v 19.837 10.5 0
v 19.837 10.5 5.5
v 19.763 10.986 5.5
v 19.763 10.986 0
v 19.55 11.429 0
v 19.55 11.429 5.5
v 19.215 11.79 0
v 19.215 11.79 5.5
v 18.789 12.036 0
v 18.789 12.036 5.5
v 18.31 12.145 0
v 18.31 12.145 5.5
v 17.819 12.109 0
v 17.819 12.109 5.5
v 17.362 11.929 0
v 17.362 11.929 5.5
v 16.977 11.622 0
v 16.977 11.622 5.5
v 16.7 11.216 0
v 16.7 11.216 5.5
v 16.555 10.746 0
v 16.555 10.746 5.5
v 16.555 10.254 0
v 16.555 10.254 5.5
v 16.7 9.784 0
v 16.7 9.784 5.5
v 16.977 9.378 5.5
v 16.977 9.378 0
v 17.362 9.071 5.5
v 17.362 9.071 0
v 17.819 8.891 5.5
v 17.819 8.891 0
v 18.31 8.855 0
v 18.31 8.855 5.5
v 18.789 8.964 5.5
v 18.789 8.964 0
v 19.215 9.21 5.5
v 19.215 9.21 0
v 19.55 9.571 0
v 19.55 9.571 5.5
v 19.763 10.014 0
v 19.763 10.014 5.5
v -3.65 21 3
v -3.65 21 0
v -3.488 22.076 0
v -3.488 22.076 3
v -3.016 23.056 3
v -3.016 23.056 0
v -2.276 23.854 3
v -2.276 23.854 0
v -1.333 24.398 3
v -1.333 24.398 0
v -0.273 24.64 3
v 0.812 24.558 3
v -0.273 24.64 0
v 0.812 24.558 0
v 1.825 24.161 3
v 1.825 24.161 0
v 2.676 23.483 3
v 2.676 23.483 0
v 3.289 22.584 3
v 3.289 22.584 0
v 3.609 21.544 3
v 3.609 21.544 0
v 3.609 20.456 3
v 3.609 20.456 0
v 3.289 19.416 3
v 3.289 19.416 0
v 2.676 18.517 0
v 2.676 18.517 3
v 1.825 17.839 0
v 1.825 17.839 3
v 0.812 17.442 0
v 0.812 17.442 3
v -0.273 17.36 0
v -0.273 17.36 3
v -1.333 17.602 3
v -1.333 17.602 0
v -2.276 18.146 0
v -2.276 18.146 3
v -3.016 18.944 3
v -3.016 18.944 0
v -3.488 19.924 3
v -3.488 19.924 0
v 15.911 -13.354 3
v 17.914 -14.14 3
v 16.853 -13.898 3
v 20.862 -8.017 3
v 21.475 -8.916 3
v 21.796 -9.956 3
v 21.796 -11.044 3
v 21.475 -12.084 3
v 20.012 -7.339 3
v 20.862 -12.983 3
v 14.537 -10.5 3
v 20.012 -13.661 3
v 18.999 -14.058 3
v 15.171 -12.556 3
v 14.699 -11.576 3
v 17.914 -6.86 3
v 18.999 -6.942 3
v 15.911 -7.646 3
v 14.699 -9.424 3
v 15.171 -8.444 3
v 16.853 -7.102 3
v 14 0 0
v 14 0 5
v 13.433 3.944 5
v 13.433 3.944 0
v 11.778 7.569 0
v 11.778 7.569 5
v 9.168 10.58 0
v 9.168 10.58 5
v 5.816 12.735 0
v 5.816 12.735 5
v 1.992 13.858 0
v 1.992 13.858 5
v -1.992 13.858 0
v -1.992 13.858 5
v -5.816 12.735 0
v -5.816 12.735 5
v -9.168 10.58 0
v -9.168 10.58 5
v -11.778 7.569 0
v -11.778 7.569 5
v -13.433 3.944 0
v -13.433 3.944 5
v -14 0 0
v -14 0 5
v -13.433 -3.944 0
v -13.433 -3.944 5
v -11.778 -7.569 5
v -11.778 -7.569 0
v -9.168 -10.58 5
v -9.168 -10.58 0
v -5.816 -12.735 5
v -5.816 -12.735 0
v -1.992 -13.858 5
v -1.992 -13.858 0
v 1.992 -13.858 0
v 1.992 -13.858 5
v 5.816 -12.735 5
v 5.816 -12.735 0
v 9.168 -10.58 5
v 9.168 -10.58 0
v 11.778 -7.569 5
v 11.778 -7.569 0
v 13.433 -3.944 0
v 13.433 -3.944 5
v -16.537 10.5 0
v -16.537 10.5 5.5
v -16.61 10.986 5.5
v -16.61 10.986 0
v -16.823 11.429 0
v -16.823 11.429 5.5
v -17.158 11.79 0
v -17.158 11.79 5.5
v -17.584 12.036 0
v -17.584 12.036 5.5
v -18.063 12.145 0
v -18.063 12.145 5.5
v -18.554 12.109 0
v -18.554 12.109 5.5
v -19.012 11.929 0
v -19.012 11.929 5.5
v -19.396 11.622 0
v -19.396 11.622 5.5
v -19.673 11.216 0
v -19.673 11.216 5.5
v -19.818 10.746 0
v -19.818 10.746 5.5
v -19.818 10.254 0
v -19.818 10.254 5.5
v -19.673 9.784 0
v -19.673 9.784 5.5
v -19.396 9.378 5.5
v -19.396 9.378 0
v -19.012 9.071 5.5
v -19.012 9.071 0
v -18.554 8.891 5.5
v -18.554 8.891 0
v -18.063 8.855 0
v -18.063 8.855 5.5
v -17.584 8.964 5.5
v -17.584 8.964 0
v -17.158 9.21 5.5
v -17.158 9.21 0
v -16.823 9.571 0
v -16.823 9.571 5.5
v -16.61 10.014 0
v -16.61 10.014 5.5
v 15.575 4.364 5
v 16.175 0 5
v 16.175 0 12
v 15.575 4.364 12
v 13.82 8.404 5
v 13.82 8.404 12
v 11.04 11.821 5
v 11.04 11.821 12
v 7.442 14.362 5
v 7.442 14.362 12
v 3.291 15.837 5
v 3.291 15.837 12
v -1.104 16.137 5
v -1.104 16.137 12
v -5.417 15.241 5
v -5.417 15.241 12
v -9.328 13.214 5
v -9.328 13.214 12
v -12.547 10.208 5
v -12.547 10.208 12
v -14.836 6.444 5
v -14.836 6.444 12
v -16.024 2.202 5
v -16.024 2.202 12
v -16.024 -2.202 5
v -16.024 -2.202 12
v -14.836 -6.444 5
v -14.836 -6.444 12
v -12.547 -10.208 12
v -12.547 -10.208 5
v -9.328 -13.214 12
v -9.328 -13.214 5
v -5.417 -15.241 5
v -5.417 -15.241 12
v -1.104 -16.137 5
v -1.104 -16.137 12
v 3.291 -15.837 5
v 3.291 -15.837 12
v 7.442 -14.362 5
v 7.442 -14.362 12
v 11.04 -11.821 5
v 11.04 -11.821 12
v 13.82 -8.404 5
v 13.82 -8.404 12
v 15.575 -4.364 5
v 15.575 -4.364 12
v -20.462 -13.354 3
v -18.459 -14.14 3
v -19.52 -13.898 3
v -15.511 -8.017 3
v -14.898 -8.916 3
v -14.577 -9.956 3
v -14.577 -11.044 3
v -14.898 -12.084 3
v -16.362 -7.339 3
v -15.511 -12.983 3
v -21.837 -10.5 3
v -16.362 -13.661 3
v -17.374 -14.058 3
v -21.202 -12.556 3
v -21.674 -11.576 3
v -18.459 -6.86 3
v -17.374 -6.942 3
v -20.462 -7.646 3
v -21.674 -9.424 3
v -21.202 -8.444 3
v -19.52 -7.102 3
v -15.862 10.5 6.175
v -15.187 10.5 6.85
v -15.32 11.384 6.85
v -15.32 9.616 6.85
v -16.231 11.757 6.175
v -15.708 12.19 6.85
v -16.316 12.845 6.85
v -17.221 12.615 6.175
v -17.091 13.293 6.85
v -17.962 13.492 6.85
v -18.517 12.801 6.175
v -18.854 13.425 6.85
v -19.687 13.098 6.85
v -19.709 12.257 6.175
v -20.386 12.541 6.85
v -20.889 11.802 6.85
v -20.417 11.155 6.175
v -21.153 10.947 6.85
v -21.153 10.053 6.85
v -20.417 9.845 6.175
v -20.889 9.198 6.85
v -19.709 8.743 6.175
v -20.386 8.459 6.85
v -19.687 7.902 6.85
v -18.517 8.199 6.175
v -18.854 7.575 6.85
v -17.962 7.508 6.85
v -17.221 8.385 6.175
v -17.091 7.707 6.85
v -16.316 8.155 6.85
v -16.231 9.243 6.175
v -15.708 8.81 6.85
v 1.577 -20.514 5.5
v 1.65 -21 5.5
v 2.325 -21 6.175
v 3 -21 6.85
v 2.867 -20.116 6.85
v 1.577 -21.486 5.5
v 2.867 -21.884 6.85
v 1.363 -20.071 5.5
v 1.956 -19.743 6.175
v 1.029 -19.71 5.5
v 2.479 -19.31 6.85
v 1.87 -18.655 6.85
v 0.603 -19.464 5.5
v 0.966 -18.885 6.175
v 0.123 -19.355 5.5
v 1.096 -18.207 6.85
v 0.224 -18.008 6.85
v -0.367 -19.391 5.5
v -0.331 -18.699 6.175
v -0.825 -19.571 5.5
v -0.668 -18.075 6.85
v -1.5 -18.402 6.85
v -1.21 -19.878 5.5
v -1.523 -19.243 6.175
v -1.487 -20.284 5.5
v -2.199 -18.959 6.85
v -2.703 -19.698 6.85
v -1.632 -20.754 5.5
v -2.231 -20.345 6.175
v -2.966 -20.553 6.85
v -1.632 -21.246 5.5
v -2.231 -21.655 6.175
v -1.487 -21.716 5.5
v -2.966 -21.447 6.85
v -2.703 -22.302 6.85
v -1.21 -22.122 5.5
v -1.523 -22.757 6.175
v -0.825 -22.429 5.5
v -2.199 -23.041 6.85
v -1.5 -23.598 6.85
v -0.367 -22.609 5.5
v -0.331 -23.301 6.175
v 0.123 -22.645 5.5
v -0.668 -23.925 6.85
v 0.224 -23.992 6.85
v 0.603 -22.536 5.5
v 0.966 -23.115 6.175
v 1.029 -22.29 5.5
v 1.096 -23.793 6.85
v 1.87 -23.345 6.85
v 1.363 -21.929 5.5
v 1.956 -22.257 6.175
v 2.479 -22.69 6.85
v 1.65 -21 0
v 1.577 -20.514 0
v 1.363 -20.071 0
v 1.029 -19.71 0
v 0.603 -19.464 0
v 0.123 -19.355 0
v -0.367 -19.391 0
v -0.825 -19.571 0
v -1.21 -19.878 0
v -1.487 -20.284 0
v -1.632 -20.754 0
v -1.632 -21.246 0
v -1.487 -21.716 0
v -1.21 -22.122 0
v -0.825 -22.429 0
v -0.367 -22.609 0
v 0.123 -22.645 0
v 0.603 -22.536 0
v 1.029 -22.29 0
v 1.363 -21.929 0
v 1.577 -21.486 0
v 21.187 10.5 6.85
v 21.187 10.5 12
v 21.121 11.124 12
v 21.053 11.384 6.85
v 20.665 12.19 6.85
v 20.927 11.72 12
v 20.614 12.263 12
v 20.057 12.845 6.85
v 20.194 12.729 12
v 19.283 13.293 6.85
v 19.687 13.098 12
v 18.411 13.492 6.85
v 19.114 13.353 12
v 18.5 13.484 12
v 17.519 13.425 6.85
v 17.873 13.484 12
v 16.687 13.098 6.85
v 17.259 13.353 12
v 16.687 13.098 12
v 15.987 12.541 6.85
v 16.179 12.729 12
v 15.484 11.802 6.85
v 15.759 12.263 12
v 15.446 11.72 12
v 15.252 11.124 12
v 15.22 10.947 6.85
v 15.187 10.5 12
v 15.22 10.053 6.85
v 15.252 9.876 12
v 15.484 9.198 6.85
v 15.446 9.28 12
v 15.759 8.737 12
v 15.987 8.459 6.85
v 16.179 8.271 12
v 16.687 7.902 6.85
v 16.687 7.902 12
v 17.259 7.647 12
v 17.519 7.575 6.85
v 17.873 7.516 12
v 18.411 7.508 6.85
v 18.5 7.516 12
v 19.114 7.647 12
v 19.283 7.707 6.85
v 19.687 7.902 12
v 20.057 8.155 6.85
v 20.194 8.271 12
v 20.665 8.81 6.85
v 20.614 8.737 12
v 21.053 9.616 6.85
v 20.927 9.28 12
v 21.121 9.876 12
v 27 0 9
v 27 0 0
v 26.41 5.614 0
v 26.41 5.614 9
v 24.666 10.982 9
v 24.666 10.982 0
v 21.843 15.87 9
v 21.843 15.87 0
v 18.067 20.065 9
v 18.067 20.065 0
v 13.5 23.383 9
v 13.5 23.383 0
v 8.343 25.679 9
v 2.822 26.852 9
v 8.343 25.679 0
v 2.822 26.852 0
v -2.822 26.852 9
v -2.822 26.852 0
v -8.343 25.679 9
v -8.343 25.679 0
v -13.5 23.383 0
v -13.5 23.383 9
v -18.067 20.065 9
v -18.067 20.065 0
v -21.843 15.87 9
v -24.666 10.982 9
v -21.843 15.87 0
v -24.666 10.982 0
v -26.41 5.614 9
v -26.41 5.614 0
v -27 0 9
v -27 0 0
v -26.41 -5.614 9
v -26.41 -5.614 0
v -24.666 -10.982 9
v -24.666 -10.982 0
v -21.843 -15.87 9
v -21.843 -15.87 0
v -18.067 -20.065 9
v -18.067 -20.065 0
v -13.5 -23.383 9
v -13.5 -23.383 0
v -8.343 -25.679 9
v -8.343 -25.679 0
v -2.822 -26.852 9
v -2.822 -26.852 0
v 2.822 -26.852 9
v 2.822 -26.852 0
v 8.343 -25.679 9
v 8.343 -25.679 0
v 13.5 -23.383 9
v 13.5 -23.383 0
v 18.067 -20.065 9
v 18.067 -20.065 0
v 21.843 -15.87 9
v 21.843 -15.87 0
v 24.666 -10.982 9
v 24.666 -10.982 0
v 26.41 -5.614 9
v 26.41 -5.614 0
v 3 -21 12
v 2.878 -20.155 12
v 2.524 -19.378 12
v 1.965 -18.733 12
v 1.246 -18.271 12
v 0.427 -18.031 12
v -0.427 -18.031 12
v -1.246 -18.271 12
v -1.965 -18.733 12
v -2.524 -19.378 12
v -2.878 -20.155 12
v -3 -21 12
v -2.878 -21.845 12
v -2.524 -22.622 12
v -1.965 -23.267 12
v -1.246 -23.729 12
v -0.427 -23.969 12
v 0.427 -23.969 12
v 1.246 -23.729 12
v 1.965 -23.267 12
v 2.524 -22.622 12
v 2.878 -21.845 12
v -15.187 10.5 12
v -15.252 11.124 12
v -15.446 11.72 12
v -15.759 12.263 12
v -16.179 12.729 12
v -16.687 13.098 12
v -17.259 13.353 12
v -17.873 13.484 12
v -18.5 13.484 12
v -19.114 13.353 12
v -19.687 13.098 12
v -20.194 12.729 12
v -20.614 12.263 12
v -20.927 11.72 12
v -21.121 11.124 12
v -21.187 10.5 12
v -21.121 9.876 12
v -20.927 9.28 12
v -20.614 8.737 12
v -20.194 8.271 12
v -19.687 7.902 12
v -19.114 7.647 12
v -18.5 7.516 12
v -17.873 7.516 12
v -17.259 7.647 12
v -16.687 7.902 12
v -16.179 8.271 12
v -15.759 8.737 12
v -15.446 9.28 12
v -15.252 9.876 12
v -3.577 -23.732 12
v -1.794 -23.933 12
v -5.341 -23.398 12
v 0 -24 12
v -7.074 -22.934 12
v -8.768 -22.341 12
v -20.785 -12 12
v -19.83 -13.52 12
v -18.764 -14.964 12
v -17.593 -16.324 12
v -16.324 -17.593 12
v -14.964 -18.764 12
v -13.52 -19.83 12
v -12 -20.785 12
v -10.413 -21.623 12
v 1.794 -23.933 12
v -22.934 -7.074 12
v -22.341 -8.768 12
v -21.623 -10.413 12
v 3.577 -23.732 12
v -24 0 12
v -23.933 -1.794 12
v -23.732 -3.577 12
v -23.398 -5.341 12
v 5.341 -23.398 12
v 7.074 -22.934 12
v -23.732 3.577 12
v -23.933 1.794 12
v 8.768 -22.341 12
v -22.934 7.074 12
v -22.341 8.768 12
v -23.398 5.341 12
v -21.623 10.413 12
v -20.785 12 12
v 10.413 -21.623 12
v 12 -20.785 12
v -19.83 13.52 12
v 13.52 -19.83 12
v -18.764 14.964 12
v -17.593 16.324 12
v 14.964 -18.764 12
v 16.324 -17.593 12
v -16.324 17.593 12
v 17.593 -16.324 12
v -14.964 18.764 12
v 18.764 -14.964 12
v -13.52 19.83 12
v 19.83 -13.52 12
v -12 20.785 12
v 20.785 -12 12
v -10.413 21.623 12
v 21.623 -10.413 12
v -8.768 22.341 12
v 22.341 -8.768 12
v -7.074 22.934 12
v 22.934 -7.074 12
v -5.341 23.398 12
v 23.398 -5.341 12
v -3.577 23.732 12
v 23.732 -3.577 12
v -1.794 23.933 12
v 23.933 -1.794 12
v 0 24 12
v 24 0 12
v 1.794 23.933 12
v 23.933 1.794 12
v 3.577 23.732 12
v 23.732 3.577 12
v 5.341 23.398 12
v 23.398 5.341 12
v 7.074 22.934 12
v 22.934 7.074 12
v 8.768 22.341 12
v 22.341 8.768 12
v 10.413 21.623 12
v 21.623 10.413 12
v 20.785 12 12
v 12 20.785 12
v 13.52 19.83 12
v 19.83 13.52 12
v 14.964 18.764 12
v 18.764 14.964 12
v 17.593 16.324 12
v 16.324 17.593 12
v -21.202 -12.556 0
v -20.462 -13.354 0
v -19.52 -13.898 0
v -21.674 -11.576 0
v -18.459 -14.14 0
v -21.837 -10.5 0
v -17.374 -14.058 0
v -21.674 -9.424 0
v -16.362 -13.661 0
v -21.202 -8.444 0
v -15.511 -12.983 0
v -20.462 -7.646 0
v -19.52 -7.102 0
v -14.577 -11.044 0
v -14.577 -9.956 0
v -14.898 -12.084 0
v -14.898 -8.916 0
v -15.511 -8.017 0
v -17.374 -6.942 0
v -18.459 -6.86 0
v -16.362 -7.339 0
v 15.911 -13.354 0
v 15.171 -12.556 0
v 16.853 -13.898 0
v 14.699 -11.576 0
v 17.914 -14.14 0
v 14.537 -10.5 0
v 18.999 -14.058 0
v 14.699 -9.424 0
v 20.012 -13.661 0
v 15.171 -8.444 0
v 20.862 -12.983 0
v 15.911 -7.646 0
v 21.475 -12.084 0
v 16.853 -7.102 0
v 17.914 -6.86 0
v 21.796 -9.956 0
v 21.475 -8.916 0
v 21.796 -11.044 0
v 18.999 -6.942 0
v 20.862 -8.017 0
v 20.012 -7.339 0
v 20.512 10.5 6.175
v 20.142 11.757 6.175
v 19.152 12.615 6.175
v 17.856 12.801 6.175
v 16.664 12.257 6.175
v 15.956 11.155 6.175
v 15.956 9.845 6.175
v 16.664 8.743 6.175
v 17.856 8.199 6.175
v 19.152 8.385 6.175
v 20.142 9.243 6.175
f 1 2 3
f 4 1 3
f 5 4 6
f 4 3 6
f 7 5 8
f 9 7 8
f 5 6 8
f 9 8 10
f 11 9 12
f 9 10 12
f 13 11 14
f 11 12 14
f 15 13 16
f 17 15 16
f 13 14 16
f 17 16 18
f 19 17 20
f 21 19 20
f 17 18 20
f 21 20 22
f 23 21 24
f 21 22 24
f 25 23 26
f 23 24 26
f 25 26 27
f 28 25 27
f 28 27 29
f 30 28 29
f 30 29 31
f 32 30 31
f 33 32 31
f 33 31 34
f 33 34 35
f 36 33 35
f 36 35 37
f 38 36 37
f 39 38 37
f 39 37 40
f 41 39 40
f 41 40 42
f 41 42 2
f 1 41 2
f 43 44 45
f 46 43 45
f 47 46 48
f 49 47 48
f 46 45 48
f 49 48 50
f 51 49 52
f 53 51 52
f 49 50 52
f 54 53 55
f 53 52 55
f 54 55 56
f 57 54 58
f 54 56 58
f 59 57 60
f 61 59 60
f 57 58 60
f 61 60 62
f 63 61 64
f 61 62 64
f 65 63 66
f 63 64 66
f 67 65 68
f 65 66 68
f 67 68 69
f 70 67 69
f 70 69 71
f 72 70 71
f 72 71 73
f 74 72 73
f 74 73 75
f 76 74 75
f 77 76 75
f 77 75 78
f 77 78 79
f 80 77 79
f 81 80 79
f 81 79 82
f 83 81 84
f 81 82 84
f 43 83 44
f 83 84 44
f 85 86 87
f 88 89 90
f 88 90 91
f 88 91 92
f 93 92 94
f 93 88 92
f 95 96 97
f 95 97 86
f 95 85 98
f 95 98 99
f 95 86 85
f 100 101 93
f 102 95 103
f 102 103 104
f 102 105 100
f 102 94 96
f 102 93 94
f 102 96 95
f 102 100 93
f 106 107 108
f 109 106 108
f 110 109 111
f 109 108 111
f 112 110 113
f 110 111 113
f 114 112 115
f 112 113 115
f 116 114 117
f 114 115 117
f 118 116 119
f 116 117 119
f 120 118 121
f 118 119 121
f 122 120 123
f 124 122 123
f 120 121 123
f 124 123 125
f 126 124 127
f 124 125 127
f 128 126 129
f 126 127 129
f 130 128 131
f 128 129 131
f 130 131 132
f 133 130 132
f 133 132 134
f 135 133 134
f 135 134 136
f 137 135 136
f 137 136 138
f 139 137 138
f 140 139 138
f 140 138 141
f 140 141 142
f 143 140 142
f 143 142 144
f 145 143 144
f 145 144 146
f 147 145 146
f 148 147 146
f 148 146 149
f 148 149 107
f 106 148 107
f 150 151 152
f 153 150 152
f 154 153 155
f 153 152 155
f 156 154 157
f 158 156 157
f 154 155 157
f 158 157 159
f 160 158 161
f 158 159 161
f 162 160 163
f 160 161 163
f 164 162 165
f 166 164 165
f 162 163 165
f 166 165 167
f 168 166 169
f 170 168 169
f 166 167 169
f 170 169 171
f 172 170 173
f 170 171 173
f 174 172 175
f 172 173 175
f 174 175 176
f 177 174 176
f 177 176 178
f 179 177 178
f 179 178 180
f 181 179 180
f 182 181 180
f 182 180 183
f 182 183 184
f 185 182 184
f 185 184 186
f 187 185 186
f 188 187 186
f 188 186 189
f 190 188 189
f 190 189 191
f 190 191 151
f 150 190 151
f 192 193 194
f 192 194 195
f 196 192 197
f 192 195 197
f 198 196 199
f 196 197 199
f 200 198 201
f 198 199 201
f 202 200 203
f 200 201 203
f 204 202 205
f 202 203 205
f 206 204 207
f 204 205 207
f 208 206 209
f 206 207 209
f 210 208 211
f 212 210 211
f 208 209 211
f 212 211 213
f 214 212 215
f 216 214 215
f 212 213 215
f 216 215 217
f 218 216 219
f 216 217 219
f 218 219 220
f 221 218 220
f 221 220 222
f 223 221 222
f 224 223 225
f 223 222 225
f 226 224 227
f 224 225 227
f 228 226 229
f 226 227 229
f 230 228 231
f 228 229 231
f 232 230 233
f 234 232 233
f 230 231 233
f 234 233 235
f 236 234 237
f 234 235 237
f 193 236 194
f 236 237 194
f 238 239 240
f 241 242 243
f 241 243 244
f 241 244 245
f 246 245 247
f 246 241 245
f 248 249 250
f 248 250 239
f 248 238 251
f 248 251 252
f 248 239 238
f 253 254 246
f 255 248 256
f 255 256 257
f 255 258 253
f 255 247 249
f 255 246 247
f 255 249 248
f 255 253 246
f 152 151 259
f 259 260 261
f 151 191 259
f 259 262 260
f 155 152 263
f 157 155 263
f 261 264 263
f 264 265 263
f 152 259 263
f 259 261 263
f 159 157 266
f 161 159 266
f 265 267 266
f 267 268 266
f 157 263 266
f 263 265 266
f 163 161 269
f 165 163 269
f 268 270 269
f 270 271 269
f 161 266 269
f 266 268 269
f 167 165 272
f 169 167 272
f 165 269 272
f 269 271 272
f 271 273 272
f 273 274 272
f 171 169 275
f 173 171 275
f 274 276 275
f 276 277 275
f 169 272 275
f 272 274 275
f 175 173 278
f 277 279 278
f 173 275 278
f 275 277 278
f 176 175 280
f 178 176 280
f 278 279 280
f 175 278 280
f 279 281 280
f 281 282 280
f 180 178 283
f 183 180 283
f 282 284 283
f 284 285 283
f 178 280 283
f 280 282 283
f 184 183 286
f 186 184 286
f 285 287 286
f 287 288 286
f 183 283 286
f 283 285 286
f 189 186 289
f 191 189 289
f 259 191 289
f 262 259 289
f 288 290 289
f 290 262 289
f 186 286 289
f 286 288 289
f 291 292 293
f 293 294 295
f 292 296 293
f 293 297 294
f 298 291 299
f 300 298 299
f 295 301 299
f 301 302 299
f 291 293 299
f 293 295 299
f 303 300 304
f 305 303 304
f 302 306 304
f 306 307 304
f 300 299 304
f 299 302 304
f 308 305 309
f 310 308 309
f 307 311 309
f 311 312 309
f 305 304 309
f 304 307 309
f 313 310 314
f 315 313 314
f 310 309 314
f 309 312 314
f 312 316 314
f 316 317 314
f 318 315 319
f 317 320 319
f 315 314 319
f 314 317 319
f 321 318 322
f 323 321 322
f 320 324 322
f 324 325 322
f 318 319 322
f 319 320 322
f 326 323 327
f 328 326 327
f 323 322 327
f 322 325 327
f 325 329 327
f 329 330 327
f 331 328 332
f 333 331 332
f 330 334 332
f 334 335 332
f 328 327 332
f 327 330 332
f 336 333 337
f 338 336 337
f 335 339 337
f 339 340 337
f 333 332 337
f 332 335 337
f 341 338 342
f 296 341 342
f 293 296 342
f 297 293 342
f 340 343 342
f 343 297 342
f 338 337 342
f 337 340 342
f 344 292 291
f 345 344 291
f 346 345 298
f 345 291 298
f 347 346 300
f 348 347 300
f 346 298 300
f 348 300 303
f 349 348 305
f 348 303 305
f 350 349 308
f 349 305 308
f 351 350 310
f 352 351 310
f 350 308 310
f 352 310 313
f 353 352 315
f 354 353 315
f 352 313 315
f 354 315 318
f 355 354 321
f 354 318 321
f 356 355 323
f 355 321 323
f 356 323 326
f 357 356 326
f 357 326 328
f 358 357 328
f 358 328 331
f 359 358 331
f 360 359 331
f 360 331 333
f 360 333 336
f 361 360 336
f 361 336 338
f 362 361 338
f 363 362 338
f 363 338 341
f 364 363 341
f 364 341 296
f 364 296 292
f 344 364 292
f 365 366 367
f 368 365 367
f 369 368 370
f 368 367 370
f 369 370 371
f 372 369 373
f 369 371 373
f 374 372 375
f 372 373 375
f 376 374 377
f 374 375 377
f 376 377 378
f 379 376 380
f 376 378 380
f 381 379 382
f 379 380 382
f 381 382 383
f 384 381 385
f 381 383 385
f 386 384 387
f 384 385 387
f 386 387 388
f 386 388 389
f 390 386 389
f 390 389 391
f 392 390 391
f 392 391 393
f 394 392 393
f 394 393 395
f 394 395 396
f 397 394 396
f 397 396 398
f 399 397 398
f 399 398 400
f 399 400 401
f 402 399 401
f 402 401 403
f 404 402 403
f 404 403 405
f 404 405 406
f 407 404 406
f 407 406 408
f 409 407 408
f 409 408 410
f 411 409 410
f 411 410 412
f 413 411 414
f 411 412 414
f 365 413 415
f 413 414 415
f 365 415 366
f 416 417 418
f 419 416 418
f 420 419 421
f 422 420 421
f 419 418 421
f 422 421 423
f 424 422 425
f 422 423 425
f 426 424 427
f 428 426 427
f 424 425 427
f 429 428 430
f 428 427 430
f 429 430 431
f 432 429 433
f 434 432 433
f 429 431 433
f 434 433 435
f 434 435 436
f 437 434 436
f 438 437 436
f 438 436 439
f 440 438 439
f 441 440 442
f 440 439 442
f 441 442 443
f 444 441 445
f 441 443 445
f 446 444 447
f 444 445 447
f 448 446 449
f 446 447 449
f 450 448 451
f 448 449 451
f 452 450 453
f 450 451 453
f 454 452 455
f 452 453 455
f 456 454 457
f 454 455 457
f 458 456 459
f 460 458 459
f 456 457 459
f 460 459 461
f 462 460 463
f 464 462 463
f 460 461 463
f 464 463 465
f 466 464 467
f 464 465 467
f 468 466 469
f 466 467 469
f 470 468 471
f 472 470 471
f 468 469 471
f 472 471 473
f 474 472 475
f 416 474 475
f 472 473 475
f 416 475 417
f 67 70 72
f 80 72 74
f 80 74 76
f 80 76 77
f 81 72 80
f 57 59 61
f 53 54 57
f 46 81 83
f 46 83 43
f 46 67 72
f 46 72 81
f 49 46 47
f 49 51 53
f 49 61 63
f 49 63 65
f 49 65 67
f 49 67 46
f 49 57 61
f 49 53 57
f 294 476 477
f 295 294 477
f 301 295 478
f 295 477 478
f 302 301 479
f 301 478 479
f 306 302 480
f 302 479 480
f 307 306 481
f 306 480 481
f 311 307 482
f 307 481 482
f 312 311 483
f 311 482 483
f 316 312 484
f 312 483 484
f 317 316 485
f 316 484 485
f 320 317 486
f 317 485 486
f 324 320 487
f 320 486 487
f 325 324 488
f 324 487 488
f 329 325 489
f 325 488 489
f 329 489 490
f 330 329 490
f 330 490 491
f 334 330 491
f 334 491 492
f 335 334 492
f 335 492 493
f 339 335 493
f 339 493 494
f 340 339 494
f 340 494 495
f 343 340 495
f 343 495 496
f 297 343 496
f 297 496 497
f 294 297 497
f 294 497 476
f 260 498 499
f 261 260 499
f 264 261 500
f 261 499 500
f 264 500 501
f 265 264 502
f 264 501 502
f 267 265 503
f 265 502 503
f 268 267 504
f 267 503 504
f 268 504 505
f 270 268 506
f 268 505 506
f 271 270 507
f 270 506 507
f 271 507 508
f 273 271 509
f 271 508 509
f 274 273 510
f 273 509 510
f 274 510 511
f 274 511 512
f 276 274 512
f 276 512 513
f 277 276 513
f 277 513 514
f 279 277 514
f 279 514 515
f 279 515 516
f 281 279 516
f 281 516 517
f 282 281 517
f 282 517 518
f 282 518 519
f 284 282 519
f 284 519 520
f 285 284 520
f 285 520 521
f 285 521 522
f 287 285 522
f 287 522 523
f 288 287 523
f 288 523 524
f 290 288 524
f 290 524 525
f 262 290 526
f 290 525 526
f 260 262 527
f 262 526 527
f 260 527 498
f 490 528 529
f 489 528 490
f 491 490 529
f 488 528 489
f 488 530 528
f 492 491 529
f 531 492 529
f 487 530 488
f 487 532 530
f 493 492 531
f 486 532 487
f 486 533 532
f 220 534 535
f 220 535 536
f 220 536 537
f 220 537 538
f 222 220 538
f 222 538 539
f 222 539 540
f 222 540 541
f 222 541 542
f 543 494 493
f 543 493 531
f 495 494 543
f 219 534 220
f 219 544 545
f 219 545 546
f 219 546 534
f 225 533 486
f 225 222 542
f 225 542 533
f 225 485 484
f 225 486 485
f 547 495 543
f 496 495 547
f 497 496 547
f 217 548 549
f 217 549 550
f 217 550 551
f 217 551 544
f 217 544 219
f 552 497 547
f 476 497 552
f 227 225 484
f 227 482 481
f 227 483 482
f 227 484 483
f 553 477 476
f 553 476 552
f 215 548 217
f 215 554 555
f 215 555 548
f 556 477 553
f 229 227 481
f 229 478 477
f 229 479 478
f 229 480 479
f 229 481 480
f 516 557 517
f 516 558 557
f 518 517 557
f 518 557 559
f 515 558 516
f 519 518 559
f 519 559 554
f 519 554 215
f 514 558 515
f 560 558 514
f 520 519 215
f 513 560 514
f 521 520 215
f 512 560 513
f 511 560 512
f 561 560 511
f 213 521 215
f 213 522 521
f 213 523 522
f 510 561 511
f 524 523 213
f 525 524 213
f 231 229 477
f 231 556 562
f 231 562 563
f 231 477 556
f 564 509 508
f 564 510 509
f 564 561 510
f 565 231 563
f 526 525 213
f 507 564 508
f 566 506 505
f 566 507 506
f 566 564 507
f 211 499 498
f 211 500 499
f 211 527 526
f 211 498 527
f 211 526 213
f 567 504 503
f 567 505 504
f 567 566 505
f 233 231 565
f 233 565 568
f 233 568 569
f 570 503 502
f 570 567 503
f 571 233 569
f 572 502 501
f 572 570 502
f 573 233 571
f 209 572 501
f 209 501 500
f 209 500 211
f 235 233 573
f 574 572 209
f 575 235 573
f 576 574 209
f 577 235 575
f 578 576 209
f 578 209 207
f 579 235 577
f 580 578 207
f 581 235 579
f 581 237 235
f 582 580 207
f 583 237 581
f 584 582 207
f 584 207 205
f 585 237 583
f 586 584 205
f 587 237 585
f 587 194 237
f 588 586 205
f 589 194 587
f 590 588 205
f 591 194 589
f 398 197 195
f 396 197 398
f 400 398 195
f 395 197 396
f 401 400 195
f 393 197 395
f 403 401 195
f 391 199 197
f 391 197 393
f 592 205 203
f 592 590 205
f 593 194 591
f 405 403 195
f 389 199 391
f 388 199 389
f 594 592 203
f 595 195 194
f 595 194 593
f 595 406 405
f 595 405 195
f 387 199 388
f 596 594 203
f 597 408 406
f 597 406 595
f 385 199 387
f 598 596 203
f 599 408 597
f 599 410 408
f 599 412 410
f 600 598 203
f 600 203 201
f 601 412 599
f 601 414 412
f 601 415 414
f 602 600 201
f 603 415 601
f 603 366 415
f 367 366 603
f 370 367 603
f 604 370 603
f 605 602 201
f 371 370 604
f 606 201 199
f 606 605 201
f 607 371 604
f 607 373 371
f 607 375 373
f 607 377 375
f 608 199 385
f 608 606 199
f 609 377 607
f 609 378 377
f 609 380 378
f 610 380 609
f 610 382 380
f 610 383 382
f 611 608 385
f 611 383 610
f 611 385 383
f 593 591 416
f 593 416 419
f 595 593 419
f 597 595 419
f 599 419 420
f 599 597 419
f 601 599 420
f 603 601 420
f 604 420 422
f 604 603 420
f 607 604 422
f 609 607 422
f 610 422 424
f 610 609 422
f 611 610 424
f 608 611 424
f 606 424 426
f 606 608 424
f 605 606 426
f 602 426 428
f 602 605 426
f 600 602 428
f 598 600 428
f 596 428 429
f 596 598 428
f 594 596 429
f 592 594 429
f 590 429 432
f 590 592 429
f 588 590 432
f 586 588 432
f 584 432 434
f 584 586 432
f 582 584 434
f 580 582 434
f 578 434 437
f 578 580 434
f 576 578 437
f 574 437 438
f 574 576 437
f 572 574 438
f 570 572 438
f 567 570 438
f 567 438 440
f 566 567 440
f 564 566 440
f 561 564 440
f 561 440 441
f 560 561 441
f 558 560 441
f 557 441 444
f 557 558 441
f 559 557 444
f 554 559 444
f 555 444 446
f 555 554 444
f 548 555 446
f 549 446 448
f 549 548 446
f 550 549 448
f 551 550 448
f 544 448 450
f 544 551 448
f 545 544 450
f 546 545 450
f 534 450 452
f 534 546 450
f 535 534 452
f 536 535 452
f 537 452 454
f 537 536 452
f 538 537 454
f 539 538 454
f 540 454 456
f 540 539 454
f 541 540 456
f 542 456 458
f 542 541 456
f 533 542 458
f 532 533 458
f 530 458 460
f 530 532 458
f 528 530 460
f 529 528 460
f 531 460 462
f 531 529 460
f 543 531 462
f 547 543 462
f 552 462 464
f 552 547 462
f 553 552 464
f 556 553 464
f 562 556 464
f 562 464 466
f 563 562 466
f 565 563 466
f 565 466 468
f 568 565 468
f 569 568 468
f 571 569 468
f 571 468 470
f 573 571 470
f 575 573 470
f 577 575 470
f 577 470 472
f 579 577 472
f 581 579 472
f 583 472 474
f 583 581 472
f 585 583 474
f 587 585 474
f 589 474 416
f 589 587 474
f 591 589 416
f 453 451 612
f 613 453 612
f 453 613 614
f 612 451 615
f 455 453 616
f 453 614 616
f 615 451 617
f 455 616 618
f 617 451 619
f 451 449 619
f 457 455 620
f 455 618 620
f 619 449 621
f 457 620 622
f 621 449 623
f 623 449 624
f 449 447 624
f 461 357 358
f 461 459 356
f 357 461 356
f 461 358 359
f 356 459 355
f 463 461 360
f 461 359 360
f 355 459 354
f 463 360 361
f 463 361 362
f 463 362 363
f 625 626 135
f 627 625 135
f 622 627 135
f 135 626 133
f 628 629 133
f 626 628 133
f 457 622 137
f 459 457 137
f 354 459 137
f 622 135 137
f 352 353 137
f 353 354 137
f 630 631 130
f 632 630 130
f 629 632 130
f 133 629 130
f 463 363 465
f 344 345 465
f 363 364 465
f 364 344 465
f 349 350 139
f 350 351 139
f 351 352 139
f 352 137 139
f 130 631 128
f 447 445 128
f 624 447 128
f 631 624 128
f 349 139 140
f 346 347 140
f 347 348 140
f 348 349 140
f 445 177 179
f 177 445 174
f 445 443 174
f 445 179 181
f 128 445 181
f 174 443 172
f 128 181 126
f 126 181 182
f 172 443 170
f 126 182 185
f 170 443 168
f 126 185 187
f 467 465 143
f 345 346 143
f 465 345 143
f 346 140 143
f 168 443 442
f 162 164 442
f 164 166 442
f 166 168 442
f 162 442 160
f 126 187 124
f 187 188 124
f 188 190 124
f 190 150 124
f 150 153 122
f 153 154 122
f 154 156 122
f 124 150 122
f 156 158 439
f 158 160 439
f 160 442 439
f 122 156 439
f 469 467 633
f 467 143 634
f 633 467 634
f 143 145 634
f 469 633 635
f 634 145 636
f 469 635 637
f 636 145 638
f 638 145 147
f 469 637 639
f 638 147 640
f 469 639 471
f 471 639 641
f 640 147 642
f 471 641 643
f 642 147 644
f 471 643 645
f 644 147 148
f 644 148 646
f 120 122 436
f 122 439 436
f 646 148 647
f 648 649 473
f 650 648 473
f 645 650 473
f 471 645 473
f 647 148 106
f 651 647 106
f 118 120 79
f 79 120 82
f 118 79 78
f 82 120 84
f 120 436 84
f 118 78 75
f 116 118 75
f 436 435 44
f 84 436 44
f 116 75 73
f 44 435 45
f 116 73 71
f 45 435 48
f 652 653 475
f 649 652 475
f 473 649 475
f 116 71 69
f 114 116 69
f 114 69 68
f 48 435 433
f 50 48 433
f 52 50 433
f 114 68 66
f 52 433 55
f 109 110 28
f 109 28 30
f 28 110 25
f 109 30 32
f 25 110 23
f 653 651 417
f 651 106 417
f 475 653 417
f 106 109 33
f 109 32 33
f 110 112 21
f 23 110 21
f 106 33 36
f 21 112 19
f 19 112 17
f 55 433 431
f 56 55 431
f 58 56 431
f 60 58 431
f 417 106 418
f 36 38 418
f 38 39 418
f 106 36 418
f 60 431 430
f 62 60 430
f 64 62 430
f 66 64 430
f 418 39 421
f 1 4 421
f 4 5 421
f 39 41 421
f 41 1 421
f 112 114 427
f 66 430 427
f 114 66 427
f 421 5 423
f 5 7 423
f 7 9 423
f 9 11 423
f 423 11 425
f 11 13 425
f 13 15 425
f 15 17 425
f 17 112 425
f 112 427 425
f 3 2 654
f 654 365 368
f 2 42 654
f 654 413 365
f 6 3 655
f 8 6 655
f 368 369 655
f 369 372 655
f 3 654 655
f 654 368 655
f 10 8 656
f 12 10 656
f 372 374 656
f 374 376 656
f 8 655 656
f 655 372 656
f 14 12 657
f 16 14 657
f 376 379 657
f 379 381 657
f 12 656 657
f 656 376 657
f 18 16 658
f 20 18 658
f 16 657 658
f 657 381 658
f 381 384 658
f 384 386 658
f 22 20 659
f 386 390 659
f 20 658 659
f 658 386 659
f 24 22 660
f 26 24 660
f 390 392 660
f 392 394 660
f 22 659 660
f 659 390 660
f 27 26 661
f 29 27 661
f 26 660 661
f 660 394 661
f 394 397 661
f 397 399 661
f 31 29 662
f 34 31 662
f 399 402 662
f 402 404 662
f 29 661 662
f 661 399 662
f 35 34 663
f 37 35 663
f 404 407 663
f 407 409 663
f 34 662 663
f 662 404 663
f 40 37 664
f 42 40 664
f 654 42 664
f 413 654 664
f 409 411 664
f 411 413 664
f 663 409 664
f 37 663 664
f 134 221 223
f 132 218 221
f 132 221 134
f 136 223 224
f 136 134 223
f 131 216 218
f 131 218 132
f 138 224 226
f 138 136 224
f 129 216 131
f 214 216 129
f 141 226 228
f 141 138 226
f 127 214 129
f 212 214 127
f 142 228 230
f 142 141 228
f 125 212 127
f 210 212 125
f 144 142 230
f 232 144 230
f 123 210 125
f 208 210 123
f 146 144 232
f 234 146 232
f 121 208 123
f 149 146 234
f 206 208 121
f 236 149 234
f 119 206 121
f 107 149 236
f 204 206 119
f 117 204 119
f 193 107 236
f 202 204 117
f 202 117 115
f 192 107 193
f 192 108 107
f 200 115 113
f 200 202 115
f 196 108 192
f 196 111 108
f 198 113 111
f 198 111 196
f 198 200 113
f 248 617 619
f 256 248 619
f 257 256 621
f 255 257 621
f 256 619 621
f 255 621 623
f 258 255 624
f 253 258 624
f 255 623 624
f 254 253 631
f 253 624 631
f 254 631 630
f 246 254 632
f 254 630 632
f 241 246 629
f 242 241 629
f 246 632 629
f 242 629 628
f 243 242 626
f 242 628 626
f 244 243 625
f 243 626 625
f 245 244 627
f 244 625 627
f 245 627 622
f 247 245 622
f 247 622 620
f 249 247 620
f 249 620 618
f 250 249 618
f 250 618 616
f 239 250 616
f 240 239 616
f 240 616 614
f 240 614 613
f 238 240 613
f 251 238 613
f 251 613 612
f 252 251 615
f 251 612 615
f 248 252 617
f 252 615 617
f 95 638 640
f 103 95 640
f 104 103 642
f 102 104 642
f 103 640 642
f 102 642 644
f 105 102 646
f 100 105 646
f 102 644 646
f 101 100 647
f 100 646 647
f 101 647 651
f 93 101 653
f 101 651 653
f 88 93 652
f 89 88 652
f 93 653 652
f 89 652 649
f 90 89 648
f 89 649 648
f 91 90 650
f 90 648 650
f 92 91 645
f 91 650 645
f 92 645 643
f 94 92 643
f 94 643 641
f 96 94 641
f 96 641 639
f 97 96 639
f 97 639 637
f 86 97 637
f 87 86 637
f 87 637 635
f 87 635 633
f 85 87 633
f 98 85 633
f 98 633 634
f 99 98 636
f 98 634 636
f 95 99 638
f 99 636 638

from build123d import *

# Parameters (mm, degrees)
SKETCH_1_R             = 27
EXTRUDE_420_DEPTH      = 12
SKETCH_2_R             = 16.175
CUT_EXTRUDE_563_DEPTH  = 7
SKETCH_3_R             = 14
CUT_EXTRUDE_654_DEPTH  = 39.820097888
SKETCH_5_R             = 1.65
CUT_EXTRUDE_1017_DEPTH = 41.024992192
SKETCH_6_R             = 3
CUT_EXTRUDE_1196_DEPTH = 5
CHAMFER_1_SIZE         = 1.5
CHAMFER_2_SIZE         = 3
SKETCH_8_R             = 3.65
CUT_EXTRUDE_1692_DEPTH = 3


# Some blends are built 0.0001 mm under size
with BuildPart() as part:
    # Эскиз1 → Extrude 420 (new body)
    with BuildSketch(Plane.XY):
        Circle(SKETCH_1_R)
    extrude(amount=EXTRUDE_420_DEPTH)

    # Эскиз2 → Cut-Extrude 563 (cut)
    with BuildSketch(Plane.XY.offset(12)):
        Circle(SKETCH_2_R)
    extrude(amount=-CUT_EXTRUDE_563_DEPTH, mode=Mode.SUBTRACT)

    # Эскиз3 → Cut-Extrude 654 (cut, through all)
    with BuildSketch(Plane.XY.offset(5)):
        Circle(SKETCH_3_R)
    extrude(amount=-CUT_EXTRUDE_654_DEPTH, mode=Mode.SUBTRACT)

    # Эскиз5 → Cut-Extrude 1017 (cut, through all)
    with BuildSketch(Plane.XY.offset(12)):
        with Locations((-18.186533479, 10.5)):
            Circle(SKETCH_5_R)
        with Locations((18.186533479, 10.5)):
            Circle(SKETCH_5_R)
        with Locations((0, -21)):
            Circle(SKETCH_5_R)
    extrude(amount=-CUT_EXTRUDE_1017_DEPTH, mode=Mode.SUBTRACT)

    # Эскиз6 → Cut-Extrude 1196 (cut)
    with BuildSketch(Plane.XY.offset(12)):
        with Locations((-18.186533479, 10.5)):
            Circle(SKETCH_6_R)
        with Locations((18.186533479, 10.5)):
            Circle(SKETCH_6_R)
        with Locations((0, -21)):
            Circle(SKETCH_6_R)
    extrude(amount=-CUT_EXTRUDE_1196_DEPTH, mode=Mode.SUBTRACT)

    # Фаска1
    # the kernel refuses this chamfer: 1.5 mm, written as the material it takes off along each edge
    with BuildSketch(Plane(origin=(0, -21, 7), x_dir=(1, 0, 0), z_dir=(0, -1, 0))) as chamfer_1_piece_1_section:
        Polygon((1.65, -CHAMFER_1_SIZE), (1.65 + CHAMFER_1_SIZE, 0), (1.65, 0), align=None)
    chamfer_1_piece_1 = revolve(axis=Axis((0, -21, 7), (0, 0, 1)), mode=Mode.PRIVATE)
    chamfer_1_piece_1 = chamfer_1_piece_1 & Plane(origin=(0, -21, 6.171694066), x_dir=(1, 0, 0), z_dir=(0, 0, 1)) * Cylinder(3, 13, mode=Mode.PRIVATE)
    add(chamfer_1_piece_1, mode=Mode.SUBTRACT)
    with BuildSketch(Plane(origin=(18.186533479, 10.5, 7), x_dir=(1, 0, 0), z_dir=(0, -1, 0))) as chamfer_1_piece_2_section:
        Polygon((1.65, -CHAMFER_1_SIZE), (1.65 + CHAMFER_1_SIZE, 0), (1.65, 0), align=None)
    chamfer_1_piece_2 = revolve(axis=Axis((18.186533479, 10.5, 7), (0, 0, 1)), mode=Mode.PRIVATE)
    chamfer_1_piece_2 = chamfer_1_piece_2 & Plane(origin=(18.186533479, 10.5, 6.171694066), x_dir=(1, 0, 0), z_dir=(0, 0, 1)) * Cylinder(3, 13, mode=Mode.PRIVATE)
    add(chamfer_1_piece_2, mode=Mode.SUBTRACT)
    with BuildSketch(Plane(origin=(-18.186533479, 10.5, 7), x_dir=(1, 0, 0), z_dir=(0, -1, 0))) as chamfer_1_piece_3_section:
        Polygon((1.65, -CHAMFER_1_SIZE), (1.65 + CHAMFER_1_SIZE, 0), (1.65, 0), align=None)
    chamfer_1_piece_3 = revolve(axis=Axis((-18.186533479, 10.5, 7), (0, 0, 1)), mode=Mode.PRIVATE)
    chamfer_1_piece_3 = chamfer_1_piece_3 & Plane(origin=(-18.186533479, 10.5, 6.171694066), x_dir=(1, 0, 0), z_dir=(0, 0, 1)) * Cylinder(3, 13, mode=Mode.PRIVATE)
    add(chamfer_1_piece_3, mode=Mode.SUBTRACT)

    # Фаска2
    chamfer_2_edges = [part.edges().sort_by_distance(p)[0] for p in [
        (-27, 0, 12),
    ]]
    chamfer(chamfer_2_edges, length=CHAMFER_2_SIZE - 0.0001)  # a hair under: the kernel refuses the full size

    # Эскиз8 → Cut-Extrude 1692 (cut)
    with BuildSketch(Plane(origin=(0, 0, 0), x_dir=(-1, 0, 0), z_dir=(0, 0, -1))):
        with Locations((0, 21)):
            Circle(SKETCH_8_R)
        with Locations((-18.186533479, -10.5)):
            Circle(SKETCH_8_R)
        with Locations((18.186533479, -10.5)):
            Circle(SKETCH_8_R)
    extrude(amount=-CUT_EXTRUDE_1692_DEPTH, mode=Mode.SUBTRACT)


solid = part.part
